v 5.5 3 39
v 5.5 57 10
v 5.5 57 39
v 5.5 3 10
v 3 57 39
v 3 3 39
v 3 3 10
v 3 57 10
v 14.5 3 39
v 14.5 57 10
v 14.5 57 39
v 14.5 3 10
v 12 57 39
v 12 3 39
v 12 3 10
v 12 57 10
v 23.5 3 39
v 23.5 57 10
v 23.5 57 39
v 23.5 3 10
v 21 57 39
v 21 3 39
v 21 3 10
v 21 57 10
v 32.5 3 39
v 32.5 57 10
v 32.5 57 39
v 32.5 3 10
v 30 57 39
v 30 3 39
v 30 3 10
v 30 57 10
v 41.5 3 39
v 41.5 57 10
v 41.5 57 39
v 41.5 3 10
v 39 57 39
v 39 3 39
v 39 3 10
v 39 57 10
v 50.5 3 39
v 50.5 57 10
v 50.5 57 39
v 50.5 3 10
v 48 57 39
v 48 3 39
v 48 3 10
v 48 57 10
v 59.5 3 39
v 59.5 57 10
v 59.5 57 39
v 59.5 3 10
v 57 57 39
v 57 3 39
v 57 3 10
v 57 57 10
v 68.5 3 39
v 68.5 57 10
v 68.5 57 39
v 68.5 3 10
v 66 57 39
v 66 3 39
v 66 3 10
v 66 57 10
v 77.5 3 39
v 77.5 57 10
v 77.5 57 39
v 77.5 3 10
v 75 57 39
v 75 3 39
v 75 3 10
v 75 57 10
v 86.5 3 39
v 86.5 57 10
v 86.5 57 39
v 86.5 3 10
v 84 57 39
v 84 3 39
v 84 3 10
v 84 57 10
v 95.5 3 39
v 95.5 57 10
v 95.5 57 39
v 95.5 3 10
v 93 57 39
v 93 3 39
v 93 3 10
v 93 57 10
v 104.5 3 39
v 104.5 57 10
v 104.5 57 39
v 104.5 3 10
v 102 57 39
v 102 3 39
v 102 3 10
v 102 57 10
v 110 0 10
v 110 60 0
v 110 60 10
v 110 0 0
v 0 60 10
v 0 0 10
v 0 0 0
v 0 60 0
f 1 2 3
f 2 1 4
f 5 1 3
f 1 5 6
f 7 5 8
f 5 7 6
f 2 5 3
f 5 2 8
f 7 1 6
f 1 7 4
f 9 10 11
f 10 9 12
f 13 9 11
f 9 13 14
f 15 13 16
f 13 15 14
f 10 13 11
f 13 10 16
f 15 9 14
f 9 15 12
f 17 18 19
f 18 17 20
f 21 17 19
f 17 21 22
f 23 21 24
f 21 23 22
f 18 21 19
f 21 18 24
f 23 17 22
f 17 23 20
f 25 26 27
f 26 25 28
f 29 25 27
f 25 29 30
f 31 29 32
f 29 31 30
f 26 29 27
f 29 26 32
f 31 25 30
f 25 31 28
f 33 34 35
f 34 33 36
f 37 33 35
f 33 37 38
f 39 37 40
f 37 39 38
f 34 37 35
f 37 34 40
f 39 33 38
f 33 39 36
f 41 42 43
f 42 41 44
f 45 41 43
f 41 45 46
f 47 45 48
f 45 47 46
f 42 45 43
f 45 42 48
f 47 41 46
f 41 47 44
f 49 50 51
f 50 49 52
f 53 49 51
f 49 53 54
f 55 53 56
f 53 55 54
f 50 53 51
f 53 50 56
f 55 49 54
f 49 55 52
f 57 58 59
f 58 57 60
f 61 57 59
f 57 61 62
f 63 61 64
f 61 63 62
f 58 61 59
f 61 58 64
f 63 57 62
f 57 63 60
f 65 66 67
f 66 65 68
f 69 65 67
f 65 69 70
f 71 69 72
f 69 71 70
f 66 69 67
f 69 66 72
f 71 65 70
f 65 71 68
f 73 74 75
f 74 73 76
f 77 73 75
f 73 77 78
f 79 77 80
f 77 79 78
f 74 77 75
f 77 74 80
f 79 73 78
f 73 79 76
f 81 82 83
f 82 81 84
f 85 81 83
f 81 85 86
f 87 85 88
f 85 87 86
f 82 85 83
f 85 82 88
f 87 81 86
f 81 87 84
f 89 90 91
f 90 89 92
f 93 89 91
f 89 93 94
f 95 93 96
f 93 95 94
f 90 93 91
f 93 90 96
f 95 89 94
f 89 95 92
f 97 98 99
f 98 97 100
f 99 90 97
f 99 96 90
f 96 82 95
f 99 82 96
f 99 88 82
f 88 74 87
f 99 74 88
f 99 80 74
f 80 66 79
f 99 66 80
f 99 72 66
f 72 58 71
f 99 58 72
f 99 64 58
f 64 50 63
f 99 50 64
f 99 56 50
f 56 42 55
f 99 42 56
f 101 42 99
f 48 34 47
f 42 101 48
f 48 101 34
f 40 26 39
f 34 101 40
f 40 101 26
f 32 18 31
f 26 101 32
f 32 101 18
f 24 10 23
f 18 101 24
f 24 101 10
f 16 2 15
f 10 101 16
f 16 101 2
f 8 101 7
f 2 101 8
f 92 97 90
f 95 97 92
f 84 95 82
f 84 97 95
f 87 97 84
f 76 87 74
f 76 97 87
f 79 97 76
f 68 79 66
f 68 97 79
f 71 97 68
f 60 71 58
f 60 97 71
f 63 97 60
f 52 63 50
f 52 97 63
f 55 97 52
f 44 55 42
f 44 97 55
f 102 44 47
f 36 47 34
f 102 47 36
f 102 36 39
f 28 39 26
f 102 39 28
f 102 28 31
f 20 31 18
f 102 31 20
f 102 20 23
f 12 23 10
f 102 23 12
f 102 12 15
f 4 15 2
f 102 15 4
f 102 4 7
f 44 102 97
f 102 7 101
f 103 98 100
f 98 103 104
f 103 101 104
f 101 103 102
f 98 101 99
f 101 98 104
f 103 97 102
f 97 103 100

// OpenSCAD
$fn = 32;

// ----------------------------------------------------------------------
// Heatsink: uniform fin block
// ----------------------------------------------------------------------

// --- parameters (mm) ---
base_l = 110;             // base length, X
base_w = 60;              // base width, Y
base_t = 10;              // base plate thickness
fin_h = 30;               // fin height above the base
fin_t = 2.5;              // fin thickness
edge = 3;                 // margin from the base ends
pitch = 9;                // fin pitch

n_fins = floor((base_l - 2 * edge - fin_t) / pitch) + 1;  // fin count
total_h = base_t + fin_h - 1;  // overall height

union() {
  cube([base_l, base_w, base_t]);
  for (i = [0 : n_fins - 1])
    translate([edge + i * pitch, edge, base_t - 1])
      cube([fin_t, base_w - 2 * edge, fin_h]);
}
